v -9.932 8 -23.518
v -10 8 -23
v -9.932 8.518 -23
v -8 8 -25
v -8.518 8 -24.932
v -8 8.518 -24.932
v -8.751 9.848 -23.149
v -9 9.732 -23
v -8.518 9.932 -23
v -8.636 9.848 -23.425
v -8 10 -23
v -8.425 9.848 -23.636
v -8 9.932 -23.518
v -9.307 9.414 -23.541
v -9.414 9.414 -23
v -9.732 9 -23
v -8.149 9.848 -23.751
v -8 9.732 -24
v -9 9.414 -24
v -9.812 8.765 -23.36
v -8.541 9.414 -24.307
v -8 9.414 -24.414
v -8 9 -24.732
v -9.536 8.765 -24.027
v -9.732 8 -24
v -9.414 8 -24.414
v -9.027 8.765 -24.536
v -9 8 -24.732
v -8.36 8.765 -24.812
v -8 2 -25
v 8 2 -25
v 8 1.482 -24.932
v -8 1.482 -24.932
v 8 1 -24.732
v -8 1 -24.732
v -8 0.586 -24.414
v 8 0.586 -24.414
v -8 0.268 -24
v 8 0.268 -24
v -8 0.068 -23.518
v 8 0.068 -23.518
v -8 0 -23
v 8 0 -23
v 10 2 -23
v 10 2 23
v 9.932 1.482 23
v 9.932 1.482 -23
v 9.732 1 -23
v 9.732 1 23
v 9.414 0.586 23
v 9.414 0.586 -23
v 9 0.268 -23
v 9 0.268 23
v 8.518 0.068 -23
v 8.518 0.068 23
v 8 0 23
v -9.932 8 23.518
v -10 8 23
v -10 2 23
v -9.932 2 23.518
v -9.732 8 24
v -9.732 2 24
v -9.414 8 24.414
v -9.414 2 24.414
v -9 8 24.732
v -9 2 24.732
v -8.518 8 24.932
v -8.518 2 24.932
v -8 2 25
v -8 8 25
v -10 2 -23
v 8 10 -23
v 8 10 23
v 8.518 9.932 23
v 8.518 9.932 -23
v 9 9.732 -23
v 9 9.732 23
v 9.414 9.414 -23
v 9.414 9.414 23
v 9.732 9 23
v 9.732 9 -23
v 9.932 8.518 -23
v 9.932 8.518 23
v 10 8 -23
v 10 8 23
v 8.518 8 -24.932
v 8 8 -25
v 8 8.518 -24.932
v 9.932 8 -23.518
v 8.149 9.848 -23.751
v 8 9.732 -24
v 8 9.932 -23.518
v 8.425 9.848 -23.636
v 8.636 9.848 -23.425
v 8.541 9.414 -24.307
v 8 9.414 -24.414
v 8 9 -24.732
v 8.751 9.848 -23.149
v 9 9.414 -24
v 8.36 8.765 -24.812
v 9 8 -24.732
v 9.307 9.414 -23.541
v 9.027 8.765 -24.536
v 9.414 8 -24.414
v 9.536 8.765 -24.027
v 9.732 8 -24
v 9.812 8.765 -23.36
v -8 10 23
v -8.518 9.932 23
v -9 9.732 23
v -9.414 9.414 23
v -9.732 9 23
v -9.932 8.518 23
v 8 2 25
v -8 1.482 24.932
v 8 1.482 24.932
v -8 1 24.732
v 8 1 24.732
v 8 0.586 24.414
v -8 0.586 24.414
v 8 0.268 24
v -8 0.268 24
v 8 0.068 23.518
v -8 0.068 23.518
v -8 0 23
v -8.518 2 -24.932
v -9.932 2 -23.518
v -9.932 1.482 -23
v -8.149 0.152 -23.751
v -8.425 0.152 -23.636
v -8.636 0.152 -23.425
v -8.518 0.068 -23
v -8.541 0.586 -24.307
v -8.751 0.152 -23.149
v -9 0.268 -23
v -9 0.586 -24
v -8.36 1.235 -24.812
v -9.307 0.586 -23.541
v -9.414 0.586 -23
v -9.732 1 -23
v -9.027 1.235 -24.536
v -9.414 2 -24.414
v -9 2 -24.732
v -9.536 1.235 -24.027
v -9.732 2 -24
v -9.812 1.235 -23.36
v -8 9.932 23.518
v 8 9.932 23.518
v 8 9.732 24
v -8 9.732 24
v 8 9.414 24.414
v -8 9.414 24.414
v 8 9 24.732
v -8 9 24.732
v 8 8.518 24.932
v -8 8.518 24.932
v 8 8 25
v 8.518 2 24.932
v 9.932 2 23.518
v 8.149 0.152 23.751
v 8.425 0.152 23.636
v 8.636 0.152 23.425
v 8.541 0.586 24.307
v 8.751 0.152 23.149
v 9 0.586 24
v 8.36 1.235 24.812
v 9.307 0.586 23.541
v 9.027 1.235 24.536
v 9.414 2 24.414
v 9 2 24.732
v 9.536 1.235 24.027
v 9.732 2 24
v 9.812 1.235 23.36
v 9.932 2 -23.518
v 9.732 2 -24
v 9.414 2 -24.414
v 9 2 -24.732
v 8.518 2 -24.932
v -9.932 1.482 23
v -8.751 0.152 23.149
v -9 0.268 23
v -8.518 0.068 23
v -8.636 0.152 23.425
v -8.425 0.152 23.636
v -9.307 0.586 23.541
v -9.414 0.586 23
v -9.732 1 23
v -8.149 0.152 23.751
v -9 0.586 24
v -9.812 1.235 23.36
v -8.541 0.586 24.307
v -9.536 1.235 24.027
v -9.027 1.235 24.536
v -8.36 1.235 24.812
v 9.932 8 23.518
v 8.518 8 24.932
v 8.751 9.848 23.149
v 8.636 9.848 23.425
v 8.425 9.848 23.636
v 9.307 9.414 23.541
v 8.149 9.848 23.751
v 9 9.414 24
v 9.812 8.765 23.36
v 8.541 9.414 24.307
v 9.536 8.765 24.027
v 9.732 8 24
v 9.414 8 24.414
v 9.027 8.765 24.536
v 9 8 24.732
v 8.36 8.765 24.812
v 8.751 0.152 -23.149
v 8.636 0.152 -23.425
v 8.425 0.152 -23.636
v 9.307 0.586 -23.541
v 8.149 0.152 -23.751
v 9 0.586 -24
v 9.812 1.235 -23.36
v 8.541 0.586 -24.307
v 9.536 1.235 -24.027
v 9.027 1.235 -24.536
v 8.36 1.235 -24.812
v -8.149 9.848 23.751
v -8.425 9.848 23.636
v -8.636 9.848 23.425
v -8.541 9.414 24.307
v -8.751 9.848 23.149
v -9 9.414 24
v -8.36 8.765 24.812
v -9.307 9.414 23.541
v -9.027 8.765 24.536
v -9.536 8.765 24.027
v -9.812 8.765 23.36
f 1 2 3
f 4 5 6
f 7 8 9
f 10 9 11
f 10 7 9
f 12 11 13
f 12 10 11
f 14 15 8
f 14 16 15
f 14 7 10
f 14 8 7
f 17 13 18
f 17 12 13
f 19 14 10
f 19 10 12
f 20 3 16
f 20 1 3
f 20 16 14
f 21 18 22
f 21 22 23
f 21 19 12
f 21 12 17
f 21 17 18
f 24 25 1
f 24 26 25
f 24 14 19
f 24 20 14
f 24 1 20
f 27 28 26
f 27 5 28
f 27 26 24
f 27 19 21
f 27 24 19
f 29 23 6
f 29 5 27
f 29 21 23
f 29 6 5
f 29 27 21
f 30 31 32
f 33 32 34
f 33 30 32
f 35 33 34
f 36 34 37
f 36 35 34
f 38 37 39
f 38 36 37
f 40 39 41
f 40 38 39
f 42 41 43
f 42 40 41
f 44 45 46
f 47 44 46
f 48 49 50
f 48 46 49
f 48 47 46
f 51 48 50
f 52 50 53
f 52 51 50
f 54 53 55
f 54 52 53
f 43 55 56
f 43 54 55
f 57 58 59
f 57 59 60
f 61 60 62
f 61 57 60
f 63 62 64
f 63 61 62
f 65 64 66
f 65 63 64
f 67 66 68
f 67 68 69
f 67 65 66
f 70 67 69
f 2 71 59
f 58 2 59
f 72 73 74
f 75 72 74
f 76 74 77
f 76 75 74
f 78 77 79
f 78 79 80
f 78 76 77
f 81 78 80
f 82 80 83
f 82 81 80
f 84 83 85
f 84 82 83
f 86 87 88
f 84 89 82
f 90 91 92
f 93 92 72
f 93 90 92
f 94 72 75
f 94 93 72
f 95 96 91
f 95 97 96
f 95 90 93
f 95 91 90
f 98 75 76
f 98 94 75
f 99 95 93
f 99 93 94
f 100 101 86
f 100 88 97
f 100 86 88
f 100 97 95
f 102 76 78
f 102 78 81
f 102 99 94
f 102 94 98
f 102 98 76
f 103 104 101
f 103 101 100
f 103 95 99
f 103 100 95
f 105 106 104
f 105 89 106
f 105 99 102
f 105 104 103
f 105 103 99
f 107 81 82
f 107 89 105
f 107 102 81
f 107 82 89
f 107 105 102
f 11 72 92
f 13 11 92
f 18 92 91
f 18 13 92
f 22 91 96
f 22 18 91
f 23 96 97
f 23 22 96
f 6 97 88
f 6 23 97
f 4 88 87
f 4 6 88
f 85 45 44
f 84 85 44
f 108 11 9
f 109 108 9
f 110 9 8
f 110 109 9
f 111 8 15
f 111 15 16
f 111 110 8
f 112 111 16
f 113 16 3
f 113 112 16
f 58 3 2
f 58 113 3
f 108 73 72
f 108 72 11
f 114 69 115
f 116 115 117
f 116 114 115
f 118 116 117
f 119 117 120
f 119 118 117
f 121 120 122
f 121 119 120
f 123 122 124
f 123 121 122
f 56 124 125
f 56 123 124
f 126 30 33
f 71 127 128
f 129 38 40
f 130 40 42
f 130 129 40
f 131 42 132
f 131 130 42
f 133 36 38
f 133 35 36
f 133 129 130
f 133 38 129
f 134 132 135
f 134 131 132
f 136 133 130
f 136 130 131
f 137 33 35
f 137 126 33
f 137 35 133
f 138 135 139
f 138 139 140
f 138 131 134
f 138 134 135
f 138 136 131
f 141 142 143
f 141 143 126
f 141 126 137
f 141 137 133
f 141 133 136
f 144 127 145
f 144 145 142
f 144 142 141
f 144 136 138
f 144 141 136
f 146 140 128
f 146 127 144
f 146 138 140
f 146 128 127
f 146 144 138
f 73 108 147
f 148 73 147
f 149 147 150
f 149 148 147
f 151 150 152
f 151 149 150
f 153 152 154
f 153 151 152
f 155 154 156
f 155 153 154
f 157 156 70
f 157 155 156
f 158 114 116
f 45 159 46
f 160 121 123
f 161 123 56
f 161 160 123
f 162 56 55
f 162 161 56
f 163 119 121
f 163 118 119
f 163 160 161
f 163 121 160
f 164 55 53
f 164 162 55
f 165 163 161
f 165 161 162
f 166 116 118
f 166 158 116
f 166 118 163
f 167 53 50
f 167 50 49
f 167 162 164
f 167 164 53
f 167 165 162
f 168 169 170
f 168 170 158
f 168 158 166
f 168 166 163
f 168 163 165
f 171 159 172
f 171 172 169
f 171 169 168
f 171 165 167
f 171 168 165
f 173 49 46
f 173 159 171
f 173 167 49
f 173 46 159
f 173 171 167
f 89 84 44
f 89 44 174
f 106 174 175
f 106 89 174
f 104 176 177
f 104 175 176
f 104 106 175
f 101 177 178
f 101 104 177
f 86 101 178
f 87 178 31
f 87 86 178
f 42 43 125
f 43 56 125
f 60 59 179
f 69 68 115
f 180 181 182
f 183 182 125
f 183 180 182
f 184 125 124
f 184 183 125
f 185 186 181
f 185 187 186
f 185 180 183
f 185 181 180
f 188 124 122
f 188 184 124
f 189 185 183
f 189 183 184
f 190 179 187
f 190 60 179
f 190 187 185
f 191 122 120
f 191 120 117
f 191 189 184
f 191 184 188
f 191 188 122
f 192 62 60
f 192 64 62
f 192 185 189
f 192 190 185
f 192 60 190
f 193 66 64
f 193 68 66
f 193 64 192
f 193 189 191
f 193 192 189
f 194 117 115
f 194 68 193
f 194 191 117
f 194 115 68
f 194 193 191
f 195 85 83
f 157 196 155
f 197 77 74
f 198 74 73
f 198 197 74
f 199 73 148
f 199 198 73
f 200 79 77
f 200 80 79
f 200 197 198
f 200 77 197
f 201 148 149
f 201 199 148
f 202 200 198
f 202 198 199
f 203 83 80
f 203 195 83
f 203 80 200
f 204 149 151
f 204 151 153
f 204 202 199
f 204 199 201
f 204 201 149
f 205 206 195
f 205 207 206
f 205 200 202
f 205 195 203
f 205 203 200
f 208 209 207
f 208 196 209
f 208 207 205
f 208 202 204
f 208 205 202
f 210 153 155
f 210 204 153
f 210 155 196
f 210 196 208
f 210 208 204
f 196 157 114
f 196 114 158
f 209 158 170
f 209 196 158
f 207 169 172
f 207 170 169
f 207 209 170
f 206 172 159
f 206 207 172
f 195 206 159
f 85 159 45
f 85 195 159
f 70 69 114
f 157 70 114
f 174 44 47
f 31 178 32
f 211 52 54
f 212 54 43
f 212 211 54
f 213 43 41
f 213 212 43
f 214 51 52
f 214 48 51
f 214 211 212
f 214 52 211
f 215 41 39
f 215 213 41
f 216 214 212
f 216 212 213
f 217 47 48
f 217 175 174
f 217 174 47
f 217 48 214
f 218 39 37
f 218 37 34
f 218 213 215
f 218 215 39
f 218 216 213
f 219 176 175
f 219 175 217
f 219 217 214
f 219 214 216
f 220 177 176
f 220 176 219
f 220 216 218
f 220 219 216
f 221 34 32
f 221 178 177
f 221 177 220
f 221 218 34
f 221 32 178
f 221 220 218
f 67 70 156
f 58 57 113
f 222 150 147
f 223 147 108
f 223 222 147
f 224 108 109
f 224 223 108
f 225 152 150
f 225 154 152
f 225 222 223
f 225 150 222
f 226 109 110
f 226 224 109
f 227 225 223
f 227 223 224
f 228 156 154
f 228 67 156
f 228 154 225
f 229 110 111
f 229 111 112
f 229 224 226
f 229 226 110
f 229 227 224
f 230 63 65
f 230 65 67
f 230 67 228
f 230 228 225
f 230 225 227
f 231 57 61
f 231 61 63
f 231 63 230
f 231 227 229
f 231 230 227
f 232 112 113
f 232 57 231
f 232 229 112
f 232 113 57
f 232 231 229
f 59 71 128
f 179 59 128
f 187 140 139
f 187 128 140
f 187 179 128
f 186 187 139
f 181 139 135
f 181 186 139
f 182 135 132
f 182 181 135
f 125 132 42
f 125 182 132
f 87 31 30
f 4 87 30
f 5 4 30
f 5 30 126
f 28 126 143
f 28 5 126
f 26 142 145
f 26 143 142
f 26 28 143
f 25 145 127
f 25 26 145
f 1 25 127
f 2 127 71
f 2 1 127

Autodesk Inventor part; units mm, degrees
ref_plane "YZ Plane" through (0, 0, 0) normal (1, 0, 0) x (0, 1, 0)
ref_plane "XZ Plane" through (0, 0, 0) normal (0, 1, 0) x (-1, 0, 0)
ref_plane "XY Plane" through (0, 0, 0) normal (0, 0, 1) x (1, 0, 0)
sketch "草图1" plane through (0, 0, 0) normal (0, 1, 0) x (-1, 0, 0)
  line L0 (10, 25) -> (-10, 25)
  line L1 (-10, 25) -> (-10, -25)
  line L2 (-10, -25) -> (10, -25)
  line L3 (10, -25) -> (10, 25)
  point P0 (0, 0)
  dimension "d0" = 20
  dimension "d1" = 50
extrude "拉伸1" add sketch "草图1" along normal blind 10
fillet "圆角1" radius 2 12 edges at (-10, 5, -25) (-10, 5, 25) (-10, 0, 0) (-10, 10, 0) (10, 5, -25) (0, 0, -25) (0, 10, -25) (10, 5, 25) (10, 0, 0) (10, 10, 0) (0, 0, 25) (0, 10, 25)
properties part number "升降板"
